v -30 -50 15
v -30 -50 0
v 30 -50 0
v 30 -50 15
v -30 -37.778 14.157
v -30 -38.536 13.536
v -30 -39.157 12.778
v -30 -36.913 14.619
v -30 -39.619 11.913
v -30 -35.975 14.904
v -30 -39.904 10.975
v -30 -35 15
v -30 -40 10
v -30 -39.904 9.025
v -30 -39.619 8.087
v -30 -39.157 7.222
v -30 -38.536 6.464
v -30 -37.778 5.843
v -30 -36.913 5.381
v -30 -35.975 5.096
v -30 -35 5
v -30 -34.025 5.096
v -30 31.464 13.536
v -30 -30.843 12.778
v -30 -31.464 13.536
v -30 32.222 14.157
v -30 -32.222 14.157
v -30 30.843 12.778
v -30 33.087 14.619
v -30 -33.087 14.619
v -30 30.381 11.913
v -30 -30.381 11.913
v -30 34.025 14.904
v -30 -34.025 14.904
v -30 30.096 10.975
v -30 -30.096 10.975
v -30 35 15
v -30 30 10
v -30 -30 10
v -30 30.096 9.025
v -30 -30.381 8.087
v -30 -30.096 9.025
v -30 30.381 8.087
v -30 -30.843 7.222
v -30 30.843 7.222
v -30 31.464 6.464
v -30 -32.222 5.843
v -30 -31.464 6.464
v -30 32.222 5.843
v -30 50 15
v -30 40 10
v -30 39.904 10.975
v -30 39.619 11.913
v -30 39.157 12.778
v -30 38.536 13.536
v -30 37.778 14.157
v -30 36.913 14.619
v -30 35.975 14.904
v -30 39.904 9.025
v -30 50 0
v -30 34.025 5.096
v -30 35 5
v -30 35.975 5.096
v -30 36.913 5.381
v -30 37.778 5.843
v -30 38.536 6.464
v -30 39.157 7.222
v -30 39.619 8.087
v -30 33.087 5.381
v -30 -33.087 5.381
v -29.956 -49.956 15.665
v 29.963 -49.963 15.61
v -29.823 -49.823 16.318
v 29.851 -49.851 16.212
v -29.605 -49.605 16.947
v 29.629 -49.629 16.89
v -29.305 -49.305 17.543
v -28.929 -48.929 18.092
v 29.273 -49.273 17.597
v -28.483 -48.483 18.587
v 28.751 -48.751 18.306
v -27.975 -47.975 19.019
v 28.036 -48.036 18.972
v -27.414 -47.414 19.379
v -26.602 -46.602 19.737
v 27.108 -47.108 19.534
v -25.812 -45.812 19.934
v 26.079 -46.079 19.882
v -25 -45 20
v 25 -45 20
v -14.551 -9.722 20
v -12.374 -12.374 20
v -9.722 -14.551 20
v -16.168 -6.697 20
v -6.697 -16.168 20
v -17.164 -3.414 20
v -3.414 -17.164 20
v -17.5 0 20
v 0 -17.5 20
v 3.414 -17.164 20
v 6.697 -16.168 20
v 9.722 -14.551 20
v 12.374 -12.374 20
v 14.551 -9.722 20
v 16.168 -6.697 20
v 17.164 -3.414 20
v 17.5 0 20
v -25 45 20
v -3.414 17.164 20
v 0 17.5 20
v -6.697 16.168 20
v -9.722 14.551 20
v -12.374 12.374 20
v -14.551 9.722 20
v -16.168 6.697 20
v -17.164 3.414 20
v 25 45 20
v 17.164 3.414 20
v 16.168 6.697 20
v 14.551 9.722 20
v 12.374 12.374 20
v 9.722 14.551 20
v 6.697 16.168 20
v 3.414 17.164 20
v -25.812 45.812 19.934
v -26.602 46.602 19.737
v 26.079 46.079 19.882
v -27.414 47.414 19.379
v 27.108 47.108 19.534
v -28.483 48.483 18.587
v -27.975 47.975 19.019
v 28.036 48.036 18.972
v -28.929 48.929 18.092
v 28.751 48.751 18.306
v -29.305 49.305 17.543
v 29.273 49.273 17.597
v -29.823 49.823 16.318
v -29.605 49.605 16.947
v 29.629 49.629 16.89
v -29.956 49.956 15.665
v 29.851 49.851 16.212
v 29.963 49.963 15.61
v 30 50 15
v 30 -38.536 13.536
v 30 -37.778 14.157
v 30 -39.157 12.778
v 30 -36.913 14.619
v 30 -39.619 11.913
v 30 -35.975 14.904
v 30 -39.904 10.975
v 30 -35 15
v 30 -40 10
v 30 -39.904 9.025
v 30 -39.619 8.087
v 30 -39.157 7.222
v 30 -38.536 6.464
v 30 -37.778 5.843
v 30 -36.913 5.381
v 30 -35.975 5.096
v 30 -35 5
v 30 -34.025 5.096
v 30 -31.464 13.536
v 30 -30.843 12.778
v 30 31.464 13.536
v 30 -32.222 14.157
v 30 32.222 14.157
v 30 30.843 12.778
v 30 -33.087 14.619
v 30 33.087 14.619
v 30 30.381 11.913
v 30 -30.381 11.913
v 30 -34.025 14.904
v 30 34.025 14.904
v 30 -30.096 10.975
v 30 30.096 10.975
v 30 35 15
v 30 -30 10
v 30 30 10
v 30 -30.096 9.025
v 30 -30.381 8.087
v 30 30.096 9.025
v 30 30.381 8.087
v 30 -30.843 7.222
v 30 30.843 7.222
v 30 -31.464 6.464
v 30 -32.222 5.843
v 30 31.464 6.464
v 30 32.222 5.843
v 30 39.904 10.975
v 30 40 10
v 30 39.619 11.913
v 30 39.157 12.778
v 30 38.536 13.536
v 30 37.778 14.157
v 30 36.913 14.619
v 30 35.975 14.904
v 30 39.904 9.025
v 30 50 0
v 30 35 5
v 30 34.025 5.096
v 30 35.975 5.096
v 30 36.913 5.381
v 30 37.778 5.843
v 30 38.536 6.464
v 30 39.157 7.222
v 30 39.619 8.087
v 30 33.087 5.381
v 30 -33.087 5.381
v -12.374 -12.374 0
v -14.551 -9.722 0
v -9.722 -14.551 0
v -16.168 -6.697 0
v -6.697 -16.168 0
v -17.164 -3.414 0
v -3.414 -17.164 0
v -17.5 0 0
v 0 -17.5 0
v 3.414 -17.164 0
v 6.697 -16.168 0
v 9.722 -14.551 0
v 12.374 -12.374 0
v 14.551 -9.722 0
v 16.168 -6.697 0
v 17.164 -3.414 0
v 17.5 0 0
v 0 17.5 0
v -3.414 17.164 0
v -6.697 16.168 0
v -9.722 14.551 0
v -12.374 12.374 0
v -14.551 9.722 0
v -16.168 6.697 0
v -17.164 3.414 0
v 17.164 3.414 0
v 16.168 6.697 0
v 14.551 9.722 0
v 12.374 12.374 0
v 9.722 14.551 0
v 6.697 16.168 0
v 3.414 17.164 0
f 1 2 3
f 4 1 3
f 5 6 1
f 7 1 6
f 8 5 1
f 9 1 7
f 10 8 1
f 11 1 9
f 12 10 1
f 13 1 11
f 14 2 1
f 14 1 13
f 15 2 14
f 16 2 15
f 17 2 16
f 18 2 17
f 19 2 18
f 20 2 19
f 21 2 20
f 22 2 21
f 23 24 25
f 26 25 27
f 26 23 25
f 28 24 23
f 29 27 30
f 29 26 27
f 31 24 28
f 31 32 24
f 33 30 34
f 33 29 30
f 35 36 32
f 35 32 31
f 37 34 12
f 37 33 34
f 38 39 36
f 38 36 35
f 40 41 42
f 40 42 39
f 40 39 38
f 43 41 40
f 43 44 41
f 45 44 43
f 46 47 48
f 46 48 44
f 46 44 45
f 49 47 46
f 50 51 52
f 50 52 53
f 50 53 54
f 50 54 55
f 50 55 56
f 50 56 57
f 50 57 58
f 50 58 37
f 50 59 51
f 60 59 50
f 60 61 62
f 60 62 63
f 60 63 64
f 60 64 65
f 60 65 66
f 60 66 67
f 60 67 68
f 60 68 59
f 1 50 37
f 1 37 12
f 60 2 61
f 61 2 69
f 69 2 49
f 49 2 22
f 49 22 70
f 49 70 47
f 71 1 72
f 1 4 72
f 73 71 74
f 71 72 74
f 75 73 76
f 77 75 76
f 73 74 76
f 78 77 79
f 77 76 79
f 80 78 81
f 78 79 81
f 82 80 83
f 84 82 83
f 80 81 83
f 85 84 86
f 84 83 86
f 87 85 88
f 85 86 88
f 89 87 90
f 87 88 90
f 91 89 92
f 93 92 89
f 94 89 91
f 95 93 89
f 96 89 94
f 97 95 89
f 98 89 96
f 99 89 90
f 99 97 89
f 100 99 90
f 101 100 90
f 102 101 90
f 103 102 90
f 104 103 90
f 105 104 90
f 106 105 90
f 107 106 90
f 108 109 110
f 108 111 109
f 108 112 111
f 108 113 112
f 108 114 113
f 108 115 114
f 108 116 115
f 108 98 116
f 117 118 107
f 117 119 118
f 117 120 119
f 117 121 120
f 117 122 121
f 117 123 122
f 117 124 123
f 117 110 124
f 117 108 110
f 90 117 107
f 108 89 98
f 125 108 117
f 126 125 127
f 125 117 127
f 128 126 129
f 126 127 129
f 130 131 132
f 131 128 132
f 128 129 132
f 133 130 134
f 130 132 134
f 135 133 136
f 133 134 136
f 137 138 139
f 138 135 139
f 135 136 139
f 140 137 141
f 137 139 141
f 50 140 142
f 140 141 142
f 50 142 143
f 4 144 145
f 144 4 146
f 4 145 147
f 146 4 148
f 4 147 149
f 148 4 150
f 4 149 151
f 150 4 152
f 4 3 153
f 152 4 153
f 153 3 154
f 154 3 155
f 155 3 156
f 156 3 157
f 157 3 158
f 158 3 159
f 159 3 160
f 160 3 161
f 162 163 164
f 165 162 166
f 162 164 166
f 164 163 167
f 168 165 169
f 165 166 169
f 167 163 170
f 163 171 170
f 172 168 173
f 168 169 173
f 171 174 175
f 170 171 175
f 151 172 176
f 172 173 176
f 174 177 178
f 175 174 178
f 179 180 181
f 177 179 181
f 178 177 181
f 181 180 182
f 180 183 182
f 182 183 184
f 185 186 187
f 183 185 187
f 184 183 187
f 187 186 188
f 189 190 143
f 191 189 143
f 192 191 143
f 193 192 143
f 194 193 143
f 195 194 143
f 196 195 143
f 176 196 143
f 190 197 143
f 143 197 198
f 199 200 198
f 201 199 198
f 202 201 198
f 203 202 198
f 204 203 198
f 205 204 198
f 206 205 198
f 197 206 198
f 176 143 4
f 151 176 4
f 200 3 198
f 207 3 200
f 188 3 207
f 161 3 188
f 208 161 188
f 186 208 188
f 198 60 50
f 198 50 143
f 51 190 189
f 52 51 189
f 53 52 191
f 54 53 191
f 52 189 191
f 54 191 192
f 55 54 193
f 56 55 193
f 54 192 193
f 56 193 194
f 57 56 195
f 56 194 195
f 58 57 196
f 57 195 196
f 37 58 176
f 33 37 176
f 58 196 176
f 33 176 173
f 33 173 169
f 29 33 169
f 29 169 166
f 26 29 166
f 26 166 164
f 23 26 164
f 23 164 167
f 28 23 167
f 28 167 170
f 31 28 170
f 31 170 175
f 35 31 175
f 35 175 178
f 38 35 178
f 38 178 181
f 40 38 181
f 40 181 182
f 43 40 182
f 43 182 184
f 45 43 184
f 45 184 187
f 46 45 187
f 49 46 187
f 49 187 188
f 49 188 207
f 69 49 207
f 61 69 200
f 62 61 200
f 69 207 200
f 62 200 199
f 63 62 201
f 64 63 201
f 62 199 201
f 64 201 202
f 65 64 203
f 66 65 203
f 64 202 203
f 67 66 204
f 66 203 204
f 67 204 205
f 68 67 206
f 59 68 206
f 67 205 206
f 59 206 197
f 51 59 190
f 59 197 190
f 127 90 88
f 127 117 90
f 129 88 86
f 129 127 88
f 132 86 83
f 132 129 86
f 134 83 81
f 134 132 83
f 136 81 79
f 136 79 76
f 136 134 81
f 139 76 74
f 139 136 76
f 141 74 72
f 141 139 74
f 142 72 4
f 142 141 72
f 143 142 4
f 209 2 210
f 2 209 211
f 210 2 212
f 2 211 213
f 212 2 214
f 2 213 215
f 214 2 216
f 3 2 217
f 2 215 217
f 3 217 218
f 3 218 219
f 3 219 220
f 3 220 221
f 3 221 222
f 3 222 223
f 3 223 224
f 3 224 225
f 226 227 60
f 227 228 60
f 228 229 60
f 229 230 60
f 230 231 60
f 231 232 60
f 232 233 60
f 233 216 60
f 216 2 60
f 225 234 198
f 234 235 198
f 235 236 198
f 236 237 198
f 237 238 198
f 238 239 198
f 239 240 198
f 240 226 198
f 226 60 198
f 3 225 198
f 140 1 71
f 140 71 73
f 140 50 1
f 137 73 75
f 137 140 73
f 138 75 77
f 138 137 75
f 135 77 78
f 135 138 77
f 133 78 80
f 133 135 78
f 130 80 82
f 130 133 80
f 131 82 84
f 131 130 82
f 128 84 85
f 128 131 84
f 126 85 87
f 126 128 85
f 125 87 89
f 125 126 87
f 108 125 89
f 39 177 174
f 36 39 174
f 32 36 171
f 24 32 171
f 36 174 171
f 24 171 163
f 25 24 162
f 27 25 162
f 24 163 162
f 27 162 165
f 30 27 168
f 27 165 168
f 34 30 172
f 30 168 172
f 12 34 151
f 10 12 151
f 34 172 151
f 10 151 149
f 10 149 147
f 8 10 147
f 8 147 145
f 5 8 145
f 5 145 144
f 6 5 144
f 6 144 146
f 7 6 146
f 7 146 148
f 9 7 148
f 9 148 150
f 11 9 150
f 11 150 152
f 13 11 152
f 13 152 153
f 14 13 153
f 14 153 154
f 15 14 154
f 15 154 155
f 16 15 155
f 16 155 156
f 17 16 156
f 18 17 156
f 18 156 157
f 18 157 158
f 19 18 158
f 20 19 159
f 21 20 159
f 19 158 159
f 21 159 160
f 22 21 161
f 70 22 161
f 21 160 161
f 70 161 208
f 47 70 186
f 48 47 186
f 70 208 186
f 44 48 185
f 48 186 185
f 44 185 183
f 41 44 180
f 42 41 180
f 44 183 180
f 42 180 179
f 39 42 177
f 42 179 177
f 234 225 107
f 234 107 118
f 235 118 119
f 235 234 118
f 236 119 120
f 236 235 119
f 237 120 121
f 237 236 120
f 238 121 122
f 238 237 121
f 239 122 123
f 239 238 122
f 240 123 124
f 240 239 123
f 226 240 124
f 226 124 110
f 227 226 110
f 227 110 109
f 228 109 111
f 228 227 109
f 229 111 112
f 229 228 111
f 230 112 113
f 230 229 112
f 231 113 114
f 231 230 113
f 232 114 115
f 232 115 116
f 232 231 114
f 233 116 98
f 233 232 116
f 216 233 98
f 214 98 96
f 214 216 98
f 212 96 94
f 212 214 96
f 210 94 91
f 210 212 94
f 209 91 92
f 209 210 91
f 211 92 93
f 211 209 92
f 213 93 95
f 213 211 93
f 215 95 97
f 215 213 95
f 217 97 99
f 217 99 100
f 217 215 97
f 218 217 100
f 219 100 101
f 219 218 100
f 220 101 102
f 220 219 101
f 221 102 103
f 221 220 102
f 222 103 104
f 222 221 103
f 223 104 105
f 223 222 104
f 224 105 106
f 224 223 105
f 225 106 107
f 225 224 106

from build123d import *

# Parameters (mm, degrees)
F0_W     = 60
F0_H     = 100
F0_R     = 17.5
F1_DEPTH = 20
F2_W     = 100
F2_H     = 20
F2_R     = 5
F3_DEPTH = 100
F4_R     = 4.99999


# Not quite as in the source:
# - a fillet or chamfer is up to 0.001 mm smaller than in the source, because OpenCascade refuses the exact size


with BuildPart() as f1:
    # F0 (on Top) → F1 (new body)
    with BuildSketch(Plane.XY):
        Rectangle(F0_W, F0_H)
        Circle(F0_R, mode=Mode.SUBTRACT)
    extrude(amount=F1_DEPTH)

    # F2 (on face) → F3 (intersect)
    with BuildSketch(Plane.YZ.offset(30)):
        with Locations((0, 10)):
            Rectangle(F2_W, F2_H)
        with Locations((-35, 10)):
            Circle(F2_R, mode=Mode.SUBTRACT)
        with Locations((35, 10)):
            Circle(F2_R, mode=Mode.SUBTRACT)
    extrude(amount=-F3_DEPTH, mode=Mode.INTERSECT)

    # F4 (radius 5 in the source; OpenCascade refuses exactly that, so slightly less here)
    f4_edges = [f1.edges().sort_by_distance(p)[0] for p in [
        (30, 0, 20),
        (0, -50, 20),
        (-30, 0, 20),
        (0, 50, 20),
    ]]
    fillet(f4_edges, radius=F4_R)


solid = f1.part
